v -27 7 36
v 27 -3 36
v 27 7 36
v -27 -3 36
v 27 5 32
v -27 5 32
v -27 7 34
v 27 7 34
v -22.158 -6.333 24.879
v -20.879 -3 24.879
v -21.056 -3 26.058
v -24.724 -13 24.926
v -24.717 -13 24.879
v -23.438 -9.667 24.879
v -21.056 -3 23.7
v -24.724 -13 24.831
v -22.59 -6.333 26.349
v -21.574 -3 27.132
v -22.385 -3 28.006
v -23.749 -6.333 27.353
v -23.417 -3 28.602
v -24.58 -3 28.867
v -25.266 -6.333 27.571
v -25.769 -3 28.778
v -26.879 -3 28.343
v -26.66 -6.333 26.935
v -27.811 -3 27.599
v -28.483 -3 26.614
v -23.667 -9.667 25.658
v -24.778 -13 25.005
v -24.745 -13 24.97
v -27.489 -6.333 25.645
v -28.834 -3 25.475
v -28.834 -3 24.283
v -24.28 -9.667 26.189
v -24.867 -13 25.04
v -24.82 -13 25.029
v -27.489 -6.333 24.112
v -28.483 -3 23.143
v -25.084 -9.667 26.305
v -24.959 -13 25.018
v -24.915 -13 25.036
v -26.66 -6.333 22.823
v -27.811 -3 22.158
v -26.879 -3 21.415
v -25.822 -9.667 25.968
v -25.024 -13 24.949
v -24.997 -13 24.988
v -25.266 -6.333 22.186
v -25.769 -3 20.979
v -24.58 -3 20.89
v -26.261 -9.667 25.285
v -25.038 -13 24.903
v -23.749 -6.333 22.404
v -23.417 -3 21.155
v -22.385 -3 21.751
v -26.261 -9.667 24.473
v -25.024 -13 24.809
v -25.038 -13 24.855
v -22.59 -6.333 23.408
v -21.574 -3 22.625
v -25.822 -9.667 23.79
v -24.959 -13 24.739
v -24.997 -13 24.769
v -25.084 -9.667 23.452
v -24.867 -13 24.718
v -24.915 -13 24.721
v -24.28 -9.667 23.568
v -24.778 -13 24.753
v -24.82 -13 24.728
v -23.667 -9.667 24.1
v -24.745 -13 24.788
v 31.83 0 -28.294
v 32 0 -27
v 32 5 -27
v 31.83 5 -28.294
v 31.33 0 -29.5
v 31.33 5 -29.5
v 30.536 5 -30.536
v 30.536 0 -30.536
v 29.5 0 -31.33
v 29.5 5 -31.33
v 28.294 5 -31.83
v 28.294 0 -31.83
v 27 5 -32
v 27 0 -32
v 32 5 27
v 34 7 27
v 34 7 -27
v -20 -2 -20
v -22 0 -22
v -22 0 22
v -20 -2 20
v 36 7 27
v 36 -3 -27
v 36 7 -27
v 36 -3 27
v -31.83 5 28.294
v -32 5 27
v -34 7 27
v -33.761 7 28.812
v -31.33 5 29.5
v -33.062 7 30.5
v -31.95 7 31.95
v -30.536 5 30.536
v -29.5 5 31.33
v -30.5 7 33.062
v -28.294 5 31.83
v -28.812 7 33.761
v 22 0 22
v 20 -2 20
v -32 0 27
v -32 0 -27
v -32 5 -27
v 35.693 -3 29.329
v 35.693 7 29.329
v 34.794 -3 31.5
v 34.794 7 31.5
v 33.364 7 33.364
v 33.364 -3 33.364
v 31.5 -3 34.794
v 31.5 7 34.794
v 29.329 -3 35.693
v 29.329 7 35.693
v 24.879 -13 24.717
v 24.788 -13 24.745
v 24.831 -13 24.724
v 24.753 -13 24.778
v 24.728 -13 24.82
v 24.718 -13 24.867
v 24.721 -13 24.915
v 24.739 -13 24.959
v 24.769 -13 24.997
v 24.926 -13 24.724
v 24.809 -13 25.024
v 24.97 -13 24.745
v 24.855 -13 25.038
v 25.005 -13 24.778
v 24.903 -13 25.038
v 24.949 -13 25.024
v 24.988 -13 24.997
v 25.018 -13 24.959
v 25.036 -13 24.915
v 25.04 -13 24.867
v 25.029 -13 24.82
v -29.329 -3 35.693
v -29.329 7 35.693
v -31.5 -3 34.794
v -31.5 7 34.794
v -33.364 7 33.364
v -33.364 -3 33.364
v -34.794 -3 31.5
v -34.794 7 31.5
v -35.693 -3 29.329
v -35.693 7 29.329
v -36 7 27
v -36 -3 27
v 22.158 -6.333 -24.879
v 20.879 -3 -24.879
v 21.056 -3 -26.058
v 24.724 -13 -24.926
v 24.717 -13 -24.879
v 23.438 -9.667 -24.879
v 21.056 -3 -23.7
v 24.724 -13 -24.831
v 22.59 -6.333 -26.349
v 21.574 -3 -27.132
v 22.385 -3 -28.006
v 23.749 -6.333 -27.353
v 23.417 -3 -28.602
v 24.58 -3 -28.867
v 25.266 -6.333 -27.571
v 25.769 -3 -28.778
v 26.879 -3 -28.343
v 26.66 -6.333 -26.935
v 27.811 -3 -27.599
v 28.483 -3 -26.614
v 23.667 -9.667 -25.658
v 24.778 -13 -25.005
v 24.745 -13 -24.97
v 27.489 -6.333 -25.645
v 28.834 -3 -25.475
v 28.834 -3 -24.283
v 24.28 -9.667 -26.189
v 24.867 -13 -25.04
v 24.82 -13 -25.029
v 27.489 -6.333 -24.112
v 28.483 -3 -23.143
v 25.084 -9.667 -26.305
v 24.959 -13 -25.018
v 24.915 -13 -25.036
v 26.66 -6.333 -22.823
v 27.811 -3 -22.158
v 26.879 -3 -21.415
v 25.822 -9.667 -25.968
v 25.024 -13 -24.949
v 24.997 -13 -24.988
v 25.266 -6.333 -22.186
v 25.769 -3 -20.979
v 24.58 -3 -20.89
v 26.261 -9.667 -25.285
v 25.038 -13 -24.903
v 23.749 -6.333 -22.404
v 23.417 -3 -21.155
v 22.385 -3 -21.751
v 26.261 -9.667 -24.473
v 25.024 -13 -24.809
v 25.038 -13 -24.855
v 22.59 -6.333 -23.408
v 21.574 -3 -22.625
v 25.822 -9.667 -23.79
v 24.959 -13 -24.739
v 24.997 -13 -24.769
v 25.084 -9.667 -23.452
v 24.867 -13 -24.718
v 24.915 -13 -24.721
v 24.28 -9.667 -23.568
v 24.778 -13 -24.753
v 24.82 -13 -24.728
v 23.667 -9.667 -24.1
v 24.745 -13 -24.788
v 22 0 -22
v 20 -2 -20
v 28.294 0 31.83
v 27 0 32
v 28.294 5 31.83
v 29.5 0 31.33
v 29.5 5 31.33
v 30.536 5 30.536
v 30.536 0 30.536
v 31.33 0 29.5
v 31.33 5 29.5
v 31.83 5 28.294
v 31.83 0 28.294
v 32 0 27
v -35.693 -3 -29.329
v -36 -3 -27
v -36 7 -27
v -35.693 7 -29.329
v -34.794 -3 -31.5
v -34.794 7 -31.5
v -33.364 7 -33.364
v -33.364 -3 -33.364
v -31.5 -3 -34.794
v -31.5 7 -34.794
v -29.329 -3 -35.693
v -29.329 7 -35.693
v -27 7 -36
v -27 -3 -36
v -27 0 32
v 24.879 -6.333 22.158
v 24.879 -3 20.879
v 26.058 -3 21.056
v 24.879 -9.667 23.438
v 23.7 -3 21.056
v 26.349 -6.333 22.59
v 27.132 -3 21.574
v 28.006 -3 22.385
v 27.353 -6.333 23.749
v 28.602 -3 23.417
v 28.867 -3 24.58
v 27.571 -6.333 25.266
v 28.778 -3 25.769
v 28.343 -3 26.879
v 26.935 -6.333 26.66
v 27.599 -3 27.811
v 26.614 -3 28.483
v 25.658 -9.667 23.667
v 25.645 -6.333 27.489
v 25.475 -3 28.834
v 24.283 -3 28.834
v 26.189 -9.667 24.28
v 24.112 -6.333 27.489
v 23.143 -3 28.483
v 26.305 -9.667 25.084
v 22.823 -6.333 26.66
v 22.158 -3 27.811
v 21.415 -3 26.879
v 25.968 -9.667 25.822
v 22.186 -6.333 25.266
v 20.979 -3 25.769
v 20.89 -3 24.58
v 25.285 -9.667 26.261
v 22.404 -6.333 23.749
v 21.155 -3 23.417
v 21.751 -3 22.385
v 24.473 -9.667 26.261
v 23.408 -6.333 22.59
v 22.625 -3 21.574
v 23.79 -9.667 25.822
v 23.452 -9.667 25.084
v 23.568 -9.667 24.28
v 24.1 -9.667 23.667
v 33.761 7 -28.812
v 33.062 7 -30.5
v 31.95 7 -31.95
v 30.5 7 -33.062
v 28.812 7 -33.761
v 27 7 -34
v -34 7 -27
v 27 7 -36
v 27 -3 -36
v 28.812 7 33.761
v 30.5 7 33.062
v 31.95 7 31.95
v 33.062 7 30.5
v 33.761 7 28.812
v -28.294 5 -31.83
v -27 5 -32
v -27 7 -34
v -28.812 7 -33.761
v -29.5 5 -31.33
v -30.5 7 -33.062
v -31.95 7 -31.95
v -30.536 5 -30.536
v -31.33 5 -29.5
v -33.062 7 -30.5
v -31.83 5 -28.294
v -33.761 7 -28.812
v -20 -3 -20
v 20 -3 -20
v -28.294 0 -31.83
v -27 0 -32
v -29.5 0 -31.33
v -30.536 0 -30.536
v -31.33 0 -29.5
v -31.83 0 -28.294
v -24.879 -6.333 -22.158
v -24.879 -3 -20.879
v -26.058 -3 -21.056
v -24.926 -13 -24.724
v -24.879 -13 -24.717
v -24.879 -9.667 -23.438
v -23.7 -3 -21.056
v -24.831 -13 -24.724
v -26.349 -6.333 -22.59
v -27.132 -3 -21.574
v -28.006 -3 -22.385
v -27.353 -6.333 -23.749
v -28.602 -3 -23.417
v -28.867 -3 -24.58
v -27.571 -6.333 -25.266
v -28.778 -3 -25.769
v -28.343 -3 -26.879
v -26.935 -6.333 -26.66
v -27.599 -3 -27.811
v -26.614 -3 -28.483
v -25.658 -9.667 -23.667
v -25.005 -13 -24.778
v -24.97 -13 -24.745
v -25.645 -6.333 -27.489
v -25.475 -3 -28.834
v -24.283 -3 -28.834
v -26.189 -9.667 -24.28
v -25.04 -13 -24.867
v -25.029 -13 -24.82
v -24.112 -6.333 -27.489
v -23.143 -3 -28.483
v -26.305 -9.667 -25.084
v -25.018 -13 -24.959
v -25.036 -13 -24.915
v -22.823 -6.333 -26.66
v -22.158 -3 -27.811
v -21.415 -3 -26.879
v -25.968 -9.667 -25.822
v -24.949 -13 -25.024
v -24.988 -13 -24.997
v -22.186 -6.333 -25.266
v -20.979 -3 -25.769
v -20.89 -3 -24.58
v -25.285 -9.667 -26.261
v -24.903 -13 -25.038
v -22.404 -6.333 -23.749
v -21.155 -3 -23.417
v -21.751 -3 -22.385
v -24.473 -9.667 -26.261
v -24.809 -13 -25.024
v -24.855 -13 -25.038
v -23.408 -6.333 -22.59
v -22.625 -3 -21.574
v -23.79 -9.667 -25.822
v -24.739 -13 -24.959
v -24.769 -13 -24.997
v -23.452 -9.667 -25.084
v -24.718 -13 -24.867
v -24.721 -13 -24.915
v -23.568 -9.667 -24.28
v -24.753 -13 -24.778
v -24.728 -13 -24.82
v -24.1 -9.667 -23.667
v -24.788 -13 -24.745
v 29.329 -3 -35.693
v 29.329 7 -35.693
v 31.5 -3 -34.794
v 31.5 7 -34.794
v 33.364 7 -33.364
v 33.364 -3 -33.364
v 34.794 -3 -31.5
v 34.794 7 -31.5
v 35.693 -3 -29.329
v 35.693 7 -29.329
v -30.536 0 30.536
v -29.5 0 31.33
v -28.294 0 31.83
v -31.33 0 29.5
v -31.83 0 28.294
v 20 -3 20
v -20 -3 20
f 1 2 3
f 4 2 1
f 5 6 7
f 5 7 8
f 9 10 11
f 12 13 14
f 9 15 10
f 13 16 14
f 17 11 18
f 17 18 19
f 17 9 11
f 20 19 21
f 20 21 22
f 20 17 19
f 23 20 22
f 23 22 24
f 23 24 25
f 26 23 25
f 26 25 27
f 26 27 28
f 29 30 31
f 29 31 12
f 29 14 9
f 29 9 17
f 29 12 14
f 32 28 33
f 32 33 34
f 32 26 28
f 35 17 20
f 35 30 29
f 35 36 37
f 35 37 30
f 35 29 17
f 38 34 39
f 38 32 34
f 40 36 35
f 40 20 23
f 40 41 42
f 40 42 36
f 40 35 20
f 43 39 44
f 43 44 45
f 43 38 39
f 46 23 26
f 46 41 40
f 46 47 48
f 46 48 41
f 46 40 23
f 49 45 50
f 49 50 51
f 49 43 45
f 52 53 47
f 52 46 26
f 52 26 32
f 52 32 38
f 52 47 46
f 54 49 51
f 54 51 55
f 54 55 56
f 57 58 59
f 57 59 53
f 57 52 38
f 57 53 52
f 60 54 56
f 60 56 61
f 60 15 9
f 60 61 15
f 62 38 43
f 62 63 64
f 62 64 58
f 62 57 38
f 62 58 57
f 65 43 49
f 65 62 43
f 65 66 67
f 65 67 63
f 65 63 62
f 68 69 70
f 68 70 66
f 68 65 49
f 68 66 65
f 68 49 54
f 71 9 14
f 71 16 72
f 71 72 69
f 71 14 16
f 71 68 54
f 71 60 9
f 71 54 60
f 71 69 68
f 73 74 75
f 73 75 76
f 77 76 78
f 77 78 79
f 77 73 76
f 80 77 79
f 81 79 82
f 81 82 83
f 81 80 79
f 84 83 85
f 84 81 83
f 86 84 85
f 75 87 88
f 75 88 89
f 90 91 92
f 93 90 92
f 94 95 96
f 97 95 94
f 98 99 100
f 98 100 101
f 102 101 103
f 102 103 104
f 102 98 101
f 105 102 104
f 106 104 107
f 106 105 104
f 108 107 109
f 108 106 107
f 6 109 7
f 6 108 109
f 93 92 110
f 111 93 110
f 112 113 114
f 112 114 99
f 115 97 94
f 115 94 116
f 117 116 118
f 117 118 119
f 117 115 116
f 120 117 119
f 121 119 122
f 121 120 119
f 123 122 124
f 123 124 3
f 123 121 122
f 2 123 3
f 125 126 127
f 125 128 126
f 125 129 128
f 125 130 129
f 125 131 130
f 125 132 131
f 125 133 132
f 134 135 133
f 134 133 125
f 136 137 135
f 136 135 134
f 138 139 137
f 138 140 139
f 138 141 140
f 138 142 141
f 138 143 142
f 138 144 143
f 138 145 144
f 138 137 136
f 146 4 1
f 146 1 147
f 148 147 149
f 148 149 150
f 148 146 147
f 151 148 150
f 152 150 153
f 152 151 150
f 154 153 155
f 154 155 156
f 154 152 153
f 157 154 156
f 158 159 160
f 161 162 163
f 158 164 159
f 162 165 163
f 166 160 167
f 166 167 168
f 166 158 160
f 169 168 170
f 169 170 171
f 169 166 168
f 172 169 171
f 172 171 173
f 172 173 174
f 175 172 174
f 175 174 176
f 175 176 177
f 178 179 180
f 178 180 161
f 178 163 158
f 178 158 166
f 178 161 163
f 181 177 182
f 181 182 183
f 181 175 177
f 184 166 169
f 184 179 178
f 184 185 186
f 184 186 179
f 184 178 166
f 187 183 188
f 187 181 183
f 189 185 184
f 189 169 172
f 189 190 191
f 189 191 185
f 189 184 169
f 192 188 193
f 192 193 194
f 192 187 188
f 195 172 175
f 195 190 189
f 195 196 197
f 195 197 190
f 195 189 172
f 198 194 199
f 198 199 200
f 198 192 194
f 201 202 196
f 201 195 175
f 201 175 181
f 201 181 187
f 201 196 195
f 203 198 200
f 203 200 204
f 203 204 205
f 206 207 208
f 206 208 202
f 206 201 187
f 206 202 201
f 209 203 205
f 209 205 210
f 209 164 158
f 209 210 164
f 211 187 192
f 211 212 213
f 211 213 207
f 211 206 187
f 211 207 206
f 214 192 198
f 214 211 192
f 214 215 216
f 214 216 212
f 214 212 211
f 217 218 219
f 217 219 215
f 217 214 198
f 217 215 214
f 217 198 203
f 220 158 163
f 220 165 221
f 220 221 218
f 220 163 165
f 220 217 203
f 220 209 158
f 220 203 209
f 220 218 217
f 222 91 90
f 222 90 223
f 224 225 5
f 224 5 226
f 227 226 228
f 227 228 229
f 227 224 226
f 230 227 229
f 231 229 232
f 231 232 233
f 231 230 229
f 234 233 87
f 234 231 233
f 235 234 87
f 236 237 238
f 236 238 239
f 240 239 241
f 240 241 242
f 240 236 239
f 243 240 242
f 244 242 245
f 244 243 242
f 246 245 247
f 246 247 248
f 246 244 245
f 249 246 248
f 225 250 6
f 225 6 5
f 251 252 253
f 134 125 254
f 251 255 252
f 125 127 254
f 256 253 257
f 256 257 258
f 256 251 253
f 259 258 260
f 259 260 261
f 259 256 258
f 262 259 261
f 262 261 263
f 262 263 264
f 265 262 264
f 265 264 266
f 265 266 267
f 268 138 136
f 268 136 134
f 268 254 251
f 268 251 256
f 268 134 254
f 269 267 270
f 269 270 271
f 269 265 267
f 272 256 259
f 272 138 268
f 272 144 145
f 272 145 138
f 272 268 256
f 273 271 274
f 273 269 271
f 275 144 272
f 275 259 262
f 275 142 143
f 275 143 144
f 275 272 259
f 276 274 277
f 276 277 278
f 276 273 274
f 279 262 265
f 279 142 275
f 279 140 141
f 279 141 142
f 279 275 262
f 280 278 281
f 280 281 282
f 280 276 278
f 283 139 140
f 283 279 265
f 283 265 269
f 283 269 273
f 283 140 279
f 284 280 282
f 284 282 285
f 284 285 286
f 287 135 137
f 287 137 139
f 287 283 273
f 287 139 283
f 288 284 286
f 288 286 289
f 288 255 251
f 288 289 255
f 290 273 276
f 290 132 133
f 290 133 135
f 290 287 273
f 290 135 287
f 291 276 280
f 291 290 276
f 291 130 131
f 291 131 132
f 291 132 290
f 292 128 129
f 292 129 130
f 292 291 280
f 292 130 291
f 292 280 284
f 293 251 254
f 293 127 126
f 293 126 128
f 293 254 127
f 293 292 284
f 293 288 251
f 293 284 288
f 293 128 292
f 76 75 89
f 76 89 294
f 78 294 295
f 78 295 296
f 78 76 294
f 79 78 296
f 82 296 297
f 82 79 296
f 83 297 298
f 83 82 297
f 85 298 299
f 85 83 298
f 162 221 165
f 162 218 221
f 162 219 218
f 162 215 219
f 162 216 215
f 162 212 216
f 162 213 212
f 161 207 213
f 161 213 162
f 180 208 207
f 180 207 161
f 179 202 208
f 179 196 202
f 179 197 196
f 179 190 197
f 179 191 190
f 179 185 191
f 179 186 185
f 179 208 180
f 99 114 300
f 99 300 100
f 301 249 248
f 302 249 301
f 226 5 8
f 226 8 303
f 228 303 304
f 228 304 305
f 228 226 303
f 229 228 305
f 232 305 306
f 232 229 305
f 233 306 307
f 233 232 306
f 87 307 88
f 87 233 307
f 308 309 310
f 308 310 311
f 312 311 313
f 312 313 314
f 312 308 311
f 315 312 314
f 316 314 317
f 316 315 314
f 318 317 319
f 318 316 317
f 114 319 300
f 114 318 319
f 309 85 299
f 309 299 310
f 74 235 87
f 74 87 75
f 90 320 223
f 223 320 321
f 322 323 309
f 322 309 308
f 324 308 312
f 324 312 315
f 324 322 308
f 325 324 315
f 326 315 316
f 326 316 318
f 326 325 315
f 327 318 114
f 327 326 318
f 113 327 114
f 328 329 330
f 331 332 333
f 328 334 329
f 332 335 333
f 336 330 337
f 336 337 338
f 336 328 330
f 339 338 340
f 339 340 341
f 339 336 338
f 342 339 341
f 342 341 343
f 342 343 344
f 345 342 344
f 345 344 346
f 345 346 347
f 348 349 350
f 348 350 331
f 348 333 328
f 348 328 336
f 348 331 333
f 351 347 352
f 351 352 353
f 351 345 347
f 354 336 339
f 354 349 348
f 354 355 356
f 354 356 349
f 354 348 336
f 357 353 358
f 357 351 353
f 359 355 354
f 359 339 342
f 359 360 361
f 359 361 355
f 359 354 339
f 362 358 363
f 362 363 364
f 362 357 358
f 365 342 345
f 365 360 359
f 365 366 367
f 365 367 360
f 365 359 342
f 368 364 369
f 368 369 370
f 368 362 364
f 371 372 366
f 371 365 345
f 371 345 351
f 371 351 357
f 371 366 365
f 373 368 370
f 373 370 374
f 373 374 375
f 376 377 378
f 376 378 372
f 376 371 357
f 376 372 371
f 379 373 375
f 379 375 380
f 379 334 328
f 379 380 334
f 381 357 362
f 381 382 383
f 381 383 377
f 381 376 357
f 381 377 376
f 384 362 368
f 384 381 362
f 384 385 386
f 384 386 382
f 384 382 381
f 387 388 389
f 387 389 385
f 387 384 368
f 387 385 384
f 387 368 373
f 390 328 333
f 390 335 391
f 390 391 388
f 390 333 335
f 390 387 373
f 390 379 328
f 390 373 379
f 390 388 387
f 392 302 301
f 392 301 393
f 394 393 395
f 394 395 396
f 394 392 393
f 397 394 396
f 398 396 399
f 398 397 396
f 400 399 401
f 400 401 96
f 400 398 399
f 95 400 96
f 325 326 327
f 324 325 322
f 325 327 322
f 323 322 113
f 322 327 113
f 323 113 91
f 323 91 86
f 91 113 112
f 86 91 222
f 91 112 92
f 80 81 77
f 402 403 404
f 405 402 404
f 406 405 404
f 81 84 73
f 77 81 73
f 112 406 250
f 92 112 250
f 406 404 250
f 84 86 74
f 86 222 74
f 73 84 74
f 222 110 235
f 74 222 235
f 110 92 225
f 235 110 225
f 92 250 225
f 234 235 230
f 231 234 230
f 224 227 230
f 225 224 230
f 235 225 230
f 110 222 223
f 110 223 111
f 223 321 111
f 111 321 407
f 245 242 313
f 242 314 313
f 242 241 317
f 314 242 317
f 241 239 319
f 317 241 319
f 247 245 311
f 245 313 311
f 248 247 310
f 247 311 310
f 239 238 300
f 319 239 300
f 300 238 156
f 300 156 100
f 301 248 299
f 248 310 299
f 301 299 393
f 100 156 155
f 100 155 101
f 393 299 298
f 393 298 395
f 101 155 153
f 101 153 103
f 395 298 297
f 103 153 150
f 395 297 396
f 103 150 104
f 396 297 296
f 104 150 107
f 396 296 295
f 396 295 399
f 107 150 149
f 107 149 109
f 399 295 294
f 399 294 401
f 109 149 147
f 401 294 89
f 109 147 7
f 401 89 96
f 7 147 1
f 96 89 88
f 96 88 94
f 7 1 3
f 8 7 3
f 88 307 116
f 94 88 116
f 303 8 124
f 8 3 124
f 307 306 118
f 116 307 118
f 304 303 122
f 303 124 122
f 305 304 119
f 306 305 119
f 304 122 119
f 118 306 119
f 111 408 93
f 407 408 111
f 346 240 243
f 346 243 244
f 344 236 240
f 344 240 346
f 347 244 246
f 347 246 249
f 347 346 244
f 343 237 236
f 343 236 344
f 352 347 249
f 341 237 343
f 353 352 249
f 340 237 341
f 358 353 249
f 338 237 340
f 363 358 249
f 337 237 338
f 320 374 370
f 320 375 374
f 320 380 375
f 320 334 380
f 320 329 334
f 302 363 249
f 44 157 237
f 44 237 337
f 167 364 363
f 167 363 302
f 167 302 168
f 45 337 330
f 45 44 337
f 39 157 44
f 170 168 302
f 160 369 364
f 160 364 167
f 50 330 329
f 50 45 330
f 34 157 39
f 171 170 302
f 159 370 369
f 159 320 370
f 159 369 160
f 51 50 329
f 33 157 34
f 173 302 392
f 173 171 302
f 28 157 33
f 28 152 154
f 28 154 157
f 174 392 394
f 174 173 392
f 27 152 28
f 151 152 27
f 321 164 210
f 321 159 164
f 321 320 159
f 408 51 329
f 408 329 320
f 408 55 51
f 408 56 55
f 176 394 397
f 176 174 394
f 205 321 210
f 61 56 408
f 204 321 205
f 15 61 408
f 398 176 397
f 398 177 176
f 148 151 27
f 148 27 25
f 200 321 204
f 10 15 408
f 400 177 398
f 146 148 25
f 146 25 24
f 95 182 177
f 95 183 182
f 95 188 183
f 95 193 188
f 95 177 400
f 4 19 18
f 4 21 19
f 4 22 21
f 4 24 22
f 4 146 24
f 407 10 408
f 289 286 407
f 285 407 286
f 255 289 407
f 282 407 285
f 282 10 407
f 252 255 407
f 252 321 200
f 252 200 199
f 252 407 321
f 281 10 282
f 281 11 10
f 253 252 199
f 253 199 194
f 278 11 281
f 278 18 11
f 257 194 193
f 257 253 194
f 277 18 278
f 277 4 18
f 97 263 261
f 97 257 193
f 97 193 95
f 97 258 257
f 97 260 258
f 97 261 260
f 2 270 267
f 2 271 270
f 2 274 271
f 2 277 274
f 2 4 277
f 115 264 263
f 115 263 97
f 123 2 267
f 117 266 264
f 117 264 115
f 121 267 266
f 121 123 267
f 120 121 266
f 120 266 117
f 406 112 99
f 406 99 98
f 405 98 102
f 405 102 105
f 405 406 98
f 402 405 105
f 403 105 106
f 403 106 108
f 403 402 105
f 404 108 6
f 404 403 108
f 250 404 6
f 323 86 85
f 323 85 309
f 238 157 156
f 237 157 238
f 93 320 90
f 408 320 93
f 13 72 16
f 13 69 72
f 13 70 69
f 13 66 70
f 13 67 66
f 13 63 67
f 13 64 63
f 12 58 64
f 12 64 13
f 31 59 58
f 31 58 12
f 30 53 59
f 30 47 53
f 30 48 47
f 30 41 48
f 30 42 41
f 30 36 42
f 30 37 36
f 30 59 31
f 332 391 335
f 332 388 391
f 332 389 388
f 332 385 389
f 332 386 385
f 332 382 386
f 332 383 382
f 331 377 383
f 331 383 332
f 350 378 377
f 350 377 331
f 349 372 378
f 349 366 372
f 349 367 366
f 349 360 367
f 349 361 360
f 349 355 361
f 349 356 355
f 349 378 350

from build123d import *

# Parameters (mm, degrees)
F1_DEPTH = 3
F2_R     = 4
F3_DEPTH = 10
F3_TAPER = 21
F5_COUNT = 4
F5_ANGLE = 270
F7_DEPTH = 10
F8_W     = 40
F8_H     = 40
F9_DEPTH = 3
F10_SIZE = 2


with BuildPart() as f1:
    # F0 (on Front) → F1 (new body)
    with BuildSketch(Plane.XZ):
        with BuildLine():
            ThreePointArc((32, 27), (30.5355339059, 30.5355339059), (27, 32))
            Line((27, 32), (-27, 32))
            ThreePointArc((-27, 32), (-30.5355339059, 30.5355339059), (-32, 27))
            Line((-32, 27), (-32, -27))
            ThreePointArc((-32, -27), (-30.5355339059, -30.5355339059), (-27, -32))
            Line((-27, -32), (27, -32))
            ThreePointArc((27, -32), (30.5355339059, -30.5355339059), (32, -27))
            Line((32, -27), (32, 27))
        make_face()
    extrude(amount=F1_DEPTH)

    # F2 (on face) → F3 (join)
    with BuildSketch(Plane.XZ.offset(3)):
        with Locations((-24.8786796564, 24.8786796564)):
            Circle(F2_R)
    extrude(amount=F3_DEPTH, taper=F3_TAPER)

    # F5: F1 ×4 about axis
    f5_axis = Axis((0, -16.6125968099, 0), (0, -1, 0))


with BuildPart() as f1_1:
    add(f1.part)
    for i in range(1, F5_COUNT):
        add(f1.part.rotate(f5_axis, i * F5_ANGLE / (F5_COUNT - 1)))

    # F6 (on face) → F7 (join)
    with BuildSketch(Plane.XZ.offset(3)):
        with BuildLine():
            ThreePointArc((-27, 36), (-33.3639610307, 33.3639610307), (-36, 27))
            Line((-36, 27), (-36, -27))
            ThreePointArc((-36, -27), (-33.3639610307, -33.3639610307), (-27, -36))
            Line((-27, -36), (27, -36))
            ThreePointArc((27, -36), (33.3639610307, -33.3639610307), (36, -27))
            Line((36, -27), (36, 27))
            ThreePointArc((36, 27), (33.3639610307, 33.3639610307), (27, 36))
            Line((27, 36), (-27, 36))
        make_face()
        with BuildLine():
            ThreePointArc((27, 32), (30.5355339059, 30.5355339059), (32, 27))
            Line((32, 27), (32, -27))
            ThreePointArc((32, -27), (30.5355339059, -30.5355339059), (27, -32))
            Line((27, -32), (-27, -32))
            ThreePointArc((-27, -32), (-30.5355339059, -30.5355339059), (-32, -27))
            Line((-32, -27), (-32, 27))
            ThreePointArc((-32, 27), (-30.5355339059, 30.5355339059), (-27, 32))
            Line((-27, 32), (27, 32))
        make_face(mode=Mode.SUBTRACT)
    extrude(amount=-F7_DEPTH)

    # F8 (on face) → F9 (cut)
    with BuildSketch(Plane.XZ.offset(3)):
        Rectangle(F8_W, F8_H)
    extrude(amount=-F9_DEPTH, mode=Mode.SUBTRACT)

    # F10
    f10_edges = [f1_1.edges().sort_by_distance(p)[0] for p in [
        (0, 7, -32),
        (0, 0, -20),
        (20, 0, 0),
        (-20, 0, 0),
        (0, 0, 20),
    ]]
    chamfer(f10_edges, length=F10_SIZE)


solid = f1_1.part
